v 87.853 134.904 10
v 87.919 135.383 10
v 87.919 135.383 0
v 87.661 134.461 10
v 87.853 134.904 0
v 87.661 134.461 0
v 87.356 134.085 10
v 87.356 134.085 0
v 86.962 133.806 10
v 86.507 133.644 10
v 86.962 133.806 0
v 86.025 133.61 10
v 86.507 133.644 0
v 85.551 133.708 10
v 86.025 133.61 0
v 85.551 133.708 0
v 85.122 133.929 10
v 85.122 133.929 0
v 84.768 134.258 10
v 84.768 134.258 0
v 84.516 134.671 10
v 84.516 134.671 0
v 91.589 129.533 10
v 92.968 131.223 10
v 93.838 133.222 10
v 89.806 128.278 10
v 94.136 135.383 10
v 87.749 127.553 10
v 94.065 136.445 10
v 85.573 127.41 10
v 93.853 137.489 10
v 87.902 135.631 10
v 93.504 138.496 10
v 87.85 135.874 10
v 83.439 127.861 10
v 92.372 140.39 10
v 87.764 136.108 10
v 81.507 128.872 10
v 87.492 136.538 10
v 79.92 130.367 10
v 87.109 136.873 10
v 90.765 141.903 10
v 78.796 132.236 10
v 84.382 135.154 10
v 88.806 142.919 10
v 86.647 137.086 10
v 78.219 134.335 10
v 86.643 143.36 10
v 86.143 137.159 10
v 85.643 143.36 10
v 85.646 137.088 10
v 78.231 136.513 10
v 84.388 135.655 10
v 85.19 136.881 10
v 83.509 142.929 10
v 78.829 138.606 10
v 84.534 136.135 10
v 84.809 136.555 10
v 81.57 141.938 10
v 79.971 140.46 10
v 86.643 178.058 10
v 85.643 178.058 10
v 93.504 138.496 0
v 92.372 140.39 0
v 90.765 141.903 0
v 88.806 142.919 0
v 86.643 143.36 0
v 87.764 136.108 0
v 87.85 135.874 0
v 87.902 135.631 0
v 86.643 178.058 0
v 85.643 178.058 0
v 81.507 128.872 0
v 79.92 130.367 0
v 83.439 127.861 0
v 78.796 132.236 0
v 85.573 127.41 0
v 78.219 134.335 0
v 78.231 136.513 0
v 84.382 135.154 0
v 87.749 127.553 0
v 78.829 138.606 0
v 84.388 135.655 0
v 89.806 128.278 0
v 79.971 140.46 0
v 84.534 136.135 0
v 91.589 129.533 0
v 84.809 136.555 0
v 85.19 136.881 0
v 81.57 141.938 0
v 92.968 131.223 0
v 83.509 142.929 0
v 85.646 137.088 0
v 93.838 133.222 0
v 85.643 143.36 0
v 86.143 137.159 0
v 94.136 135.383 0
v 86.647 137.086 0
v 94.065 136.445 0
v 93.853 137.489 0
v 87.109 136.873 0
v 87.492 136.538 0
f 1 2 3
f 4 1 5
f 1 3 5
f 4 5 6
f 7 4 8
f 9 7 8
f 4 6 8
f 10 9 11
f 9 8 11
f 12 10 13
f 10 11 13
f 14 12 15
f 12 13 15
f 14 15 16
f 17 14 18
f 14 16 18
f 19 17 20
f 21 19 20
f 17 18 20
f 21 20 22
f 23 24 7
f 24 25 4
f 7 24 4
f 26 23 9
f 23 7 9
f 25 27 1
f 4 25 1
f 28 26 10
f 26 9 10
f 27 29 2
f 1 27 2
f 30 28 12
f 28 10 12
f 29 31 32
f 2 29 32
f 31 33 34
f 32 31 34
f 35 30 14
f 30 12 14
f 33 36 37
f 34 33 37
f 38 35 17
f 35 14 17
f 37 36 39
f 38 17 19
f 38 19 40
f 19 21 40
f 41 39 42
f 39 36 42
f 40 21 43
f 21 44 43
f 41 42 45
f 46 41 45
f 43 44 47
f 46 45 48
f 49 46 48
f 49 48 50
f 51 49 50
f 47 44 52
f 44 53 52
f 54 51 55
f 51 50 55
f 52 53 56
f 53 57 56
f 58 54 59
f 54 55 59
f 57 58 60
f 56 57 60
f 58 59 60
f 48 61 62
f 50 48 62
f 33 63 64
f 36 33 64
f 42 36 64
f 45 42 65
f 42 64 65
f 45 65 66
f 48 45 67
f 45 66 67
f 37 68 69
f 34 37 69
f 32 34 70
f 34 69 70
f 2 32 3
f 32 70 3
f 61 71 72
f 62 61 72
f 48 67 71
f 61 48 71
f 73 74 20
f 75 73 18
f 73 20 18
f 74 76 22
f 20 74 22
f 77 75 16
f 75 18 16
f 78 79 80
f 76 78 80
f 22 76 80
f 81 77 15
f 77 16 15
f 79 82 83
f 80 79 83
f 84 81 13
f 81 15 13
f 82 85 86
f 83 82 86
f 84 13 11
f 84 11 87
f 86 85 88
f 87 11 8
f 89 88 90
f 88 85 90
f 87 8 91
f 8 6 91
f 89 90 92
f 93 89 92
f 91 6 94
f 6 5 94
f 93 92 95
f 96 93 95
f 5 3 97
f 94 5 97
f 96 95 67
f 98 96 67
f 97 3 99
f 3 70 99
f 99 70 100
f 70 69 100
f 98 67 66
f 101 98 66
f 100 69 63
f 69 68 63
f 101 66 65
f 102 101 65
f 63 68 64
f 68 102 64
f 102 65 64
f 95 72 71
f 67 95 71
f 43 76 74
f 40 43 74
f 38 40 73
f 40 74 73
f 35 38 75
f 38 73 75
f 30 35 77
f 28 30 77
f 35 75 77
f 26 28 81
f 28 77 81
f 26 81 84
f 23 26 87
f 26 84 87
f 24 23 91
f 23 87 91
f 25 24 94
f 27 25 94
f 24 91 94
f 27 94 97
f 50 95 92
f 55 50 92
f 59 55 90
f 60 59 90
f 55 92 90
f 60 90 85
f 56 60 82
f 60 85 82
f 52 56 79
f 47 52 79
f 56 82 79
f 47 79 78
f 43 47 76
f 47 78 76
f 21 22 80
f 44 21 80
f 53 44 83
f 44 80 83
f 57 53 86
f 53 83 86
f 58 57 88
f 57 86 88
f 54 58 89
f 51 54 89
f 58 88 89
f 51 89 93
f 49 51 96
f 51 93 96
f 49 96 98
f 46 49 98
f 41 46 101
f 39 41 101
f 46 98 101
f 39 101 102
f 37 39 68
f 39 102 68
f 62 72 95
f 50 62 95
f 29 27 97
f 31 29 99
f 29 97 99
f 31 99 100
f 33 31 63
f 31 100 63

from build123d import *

# Parameters (mm, degrees)
EXTRUDE_1_DEPTH = 10


with BuildPart() as part:
    # Model → 凸台-拉伸1 (new body)
    # profile 1 of 8: a face of its own
    with BuildSketch(Plane.XY):
        with BuildLine():
            ThreePointArc((84.515747624, 134.670602669), (84.656484575, 136.354704261), (86.142958351, 137.15869479))
            Line((86.142958351, 137.15869479), (86.142958351, 143.375196939))
            ThreePointArc((86.142958351, 143.375196939), (85.892835846, 143.371282304), (85.642958351, 143.359542231))
            ThreePointArc((85.642958351, 143.359542231), (79.336442428, 139.572267895), (78.795813778, 132.235830705))
            add(Edge.make_bspline(
                [(78.795813778, 132.235830705), (79.201442186, 132.418540823), (79.597751424, 132.591555239), (80.43048274, 132.949140202), (80.863351604, 133.131140862), (82.114964313, 133.6560009), (82.926668954, 133.99465917), (83.986978139, 134.444262968), (84.25259172, 134.55751775), (84.515747624, 134.670602669)],
                knots=[239.817826964, 239.817826964, 239.817826964, 239.817826964, 241.118324831, 241.118324831, 242.624871419, 242.624871419, 245.637964594, 245.637964594, 246.657264609, 246.657264609, 246.657264609, 246.657264609], degree=3))
        make_face()
    # profile 2 of 8: a face of its own
    with BuildSketch(Plane.XY):
        with BuildLine():
            Line((86.142958351, 143.375196939), (86.142958351, 137.15869479))
            ThreePointArc((86.142958351, 137.15869479), (87.108905296, 136.873065368), (87.764175911, 136.108043742))
            add(Edge.make_bspline(
                [(87.764175911, 136.108043742), (88.044686421, 136.233986931), (88.329332122, 136.361475152), (89.512151447, 136.887586955), (90.447565566, 137.295513383), (92.083163303, 137.96177294), (92.753710832, 138.223187829), (93.469726438, 138.48335369), (93.487007878, 138.489621969), (93.504311736, 138.495887208)],
                knots=[0.564975086, 0.564975086, 0.564975086, 0.564975086, 1.587442363, 1.587442363, 4.749752142, 4.749752142, 6.841880027, 6.841880027, 6.893554923, 6.893554923, 6.893554923, 6.893554923], degree=3))
            ThreePointArc((93.504311736, 138.495887208), (90.765079543, 141.903163231), (86.642958351, 143.359542231))
            ThreePointArc((86.642958351, 143.359542231), (86.393080856, 143.371282304), (86.142958351, 143.375196939))
        make_face()
    # profile 3 of 8: a face of its own
    with BuildSketch(Plane.XY):
        with BuildLine():
            ThreePointArc((85.642958351, 143.359542231), (85.892835846, 143.371282304), (86.142958351, 143.375196939))
            Line((86.142958351, 143.375196939), (86.142958351, 178.058382984))
            Line((86.142958351, 178.058382984), (85.642958351, 178.058382984))
            Line((85.642958351, 178.058382984), (85.642958351, 143.359542231))
        make_face()
    # profile 4 of 8: a face of its own
    with BuildSketch(Plane.XY):
        with BuildLine():
            Line((86.142958351, 178.058382984), (86.142958351, 143.375196939))
            ThreePointArc((86.142958351, 143.375196939), (86.393080856, 143.371282304), (86.642958351, 143.359542231))
            Line((86.642958351, 143.359542231), (86.642958351, 178.058382984))
            Line((86.642958351, 178.058382984), (86.142958351, 178.058382984))
        make_face()
    # profile 5 of 8: a face of its own
    with BuildSketch(Plane.XY):
        with BuildLine():
            add(Edge.make_bspline(
                [(87.764175911, 136.108043742), (88.044686421, 136.233986931), (88.329332122, 136.361475152), (89.512151447, 136.887586955), (90.447565566, 137.295513383), (92.083163303, 137.96177294), (92.753710832, 138.223187829), (93.469726438, 138.48335369), (93.487007878, 138.489621969), (93.504311736, 138.495887208)],
                knots=[0.564975086, 0.564975086, 0.564975086, 0.564975086, 1.587442363, 1.587442363, 4.749752142, 4.749752142, 6.841880027, 6.841880027, 6.893554923, 6.893554923, 6.893554923, 6.893554923], degree=3))
            ThreePointArc((87.764175911, 136.108043742), (87.879938578, 135.753476276), (87.919101822, 135.382551319))
            ThreePointArc((87.919101822, 135.382551319), (86.506638101, 133.644039694), (84.515747624, 134.670602669))
            add(Edge.make_bspline(
                [(78.795813778, 132.235830705), (79.201442186, 132.418540823), (79.597751424, 132.591555239), (80.43048274, 132.949140202), (80.863351604, 133.131140862), (82.114964313, 133.6560009), (82.926668954, 133.99465917), (83.986978139, 134.444262968), (84.25259172, 134.55751775), (84.515747624, 134.670602669)],
                knots=[239.817826964, 239.817826964, 239.817826964, 239.817826964, 241.118324831, 241.118324831, 242.624871419, 242.624871419, 245.637964594, 245.637964594, 246.657264609, 246.657264609, 246.657264609, 246.657264609], degree=3))
            ThreePointArc((78.795813778, 132.235830705), (87.749081185, 127.552943829), (94.135603971, 135.382551319))
            ThreePointArc((94.135603971, 135.382551319), (93.976191174, 136.97089875), (93.504311736, 138.495887208))
        make_face()
        with BuildLine():
            Line((88.496502727, 133.902759243), (88.512127727, 133.958314799))
            Line((88.512127727, 133.958314799), (89.343724949, 133.958314799))
            add(Edge.make_bspline(
                [(89.343724949, 133.958314799), (89.366005787, 133.958238455), (89.408980089, 133.958091208), (89.471053535, 133.956776722), (89.528214846, 133.954691019), (89.580306274, 133.951642223), (89.627534592, 133.9479855), (89.669736637, 133.942554801), (89.707184007, 133.937323238), (89.73017603, 133.932393725), (89.740860366, 133.930102993)],
                knots=[0, 0, 0, 0, 1.340730156, 2.585941556, 3.735938728, 4.782417436, 5.725908979, 6.585455251, 7.3426646, 8, 8, 8, 8], degree=3))
            add(Edge.make_bspline(
                [(89.740860366, 133.930102993), (89.765706412, 133.923464048), (89.813724826, 133.910633369), (89.879766264, 133.879782009), (89.937121094, 133.840548316), (89.984372838, 133.792792491), (90.022630996, 133.739889797), (90.049560147, 133.682258653), (90.06727416, 133.621249519), (90.068985126, 133.579098378), (90.069853421, 133.55770716)],
                knots=[0, 0, 0, 0, 1.1444407, 2.211789597, 3.231322223, 4.22529072, 5.191493565, 6.126021885, 7.048977693, 8, 8, 8, 8], degree=3))
            add(Edge.make_bspline(
                [(90.069853421, 133.55770716), (90.068909804, 133.539711572), (90.066994541, 133.503185887), (90.054506044, 133.44816215), (90.032379754, 133.393332999), (90.003916963, 133.338057211), (89.96660929, 133.285016865), (89.920448571, 133.236493922), (89.866039091, 133.192922642), (89.814439589, 133.160967962), (89.76801639, 133.137432734), (89.727972879, 133.120396865), (89.683969739, 133.102912434), (89.635185634, 133.086510324), (89.582232564, 133.070101588), (89.524694533, 133.054211436), (89.463059851, 133.03780512), (89.420153109, 133.028320648), (89.397978421, 133.023418965)],
                knots=[0, 0, 0, 0, 0.926015676, 1.879536179, 2.885868529, 3.961296715, 5.072379891, 6.209732737, 7.395503017, 8.649275246, 9.325055167, 10.071803552, 10.887356143, 11.760683543, 12.718957186, 13.739396155, 14.831694431, 16, 16, 16, 16], degree=3))
            add(Edge.make_bspline(
                [(89.397978421, 133.023418965), (89.42206246, 133.016998306), (89.468651614, 133.00457792), (89.535067023, 132.982763634), (89.595715409, 132.95982056), (89.651100787, 132.936143224), (89.700227585, 132.910105818), (89.744019154, 132.88338132), (89.781886478, 132.854956525), (89.814050432, 132.824870327), (89.84187059, 132.793564633), (89.865689713, 132.761145878), (89.885826791, 132.727400518), (89.902526046, 132.692622975), (89.915086126, 132.656311611), (89.924115105, 132.618958092), (89.930145032, 132.580326591), (89.930688233, 132.554113403), (89.930964532, 132.540780076)],
                knots=[0, 0, 0, 0, 1.531555644, 2.96270413, 4.293681306, 5.516048711, 6.661459008, 7.707599869, 8.666075599, 9.565667882, 10.409627692, 11.23655517, 12.034039933, 12.821499316, 13.603215525, 14.390323465, 15.181238721, 16, 16, 16, 16], degree=3))
            add(Edge.make_bspline(
                [(89.930964532, 132.540780076), (89.930624849, 132.528177306), (89.92994649, 132.503009206), (89.924587774, 132.465179366), (89.915280889, 132.42768631), (89.9032277, 132.389938357), (89.88700207, 132.352716467), (89.867254625, 132.31543414), (89.843812939, 132.2784648), (89.817528115, 132.241608575), (89.788110476, 132.206194712), (89.756210312, 132.172800733), (89.721562196, 132.142334206), (89.685005327, 132.114115641), (89.64647148, 132.087745357), (89.604906283, 132.065034344), (89.561447941, 132.043945869), (89.514368358, 132.025339229), (89.461239324, 132.008793245), (89.399352063, 131.995306447), (89.327899069, 131.98384116), (89.246657378, 131.974383297), (89.155736045, 131.967176307), (89.054848241, 131.962258297), (88.944302551, 131.958502897), (88.867310769, 131.958379194), (88.827231893, 131.958314799)],
                knots=[0, 0, 0, 0, 0.649983419, 1.298035872, 1.965980934, 2.640976837, 3.339692447, 4.057479056, 4.815351188, 5.596173487, 6.391204644, 7.188229986, 7.97597665, 8.768657352, 9.569725703, 10.381602759, 11.209445122, 12.06037968, 12.990438067, 14.076787314, 15.324591579, 16.722421325, 18.294818179, 20.028592824, 21.932642545, 24, 24, 24, 24], degree=3))
            Line((88.827231893, 131.958314799), (87.937040921, 131.958314799))
            Line((87.937040921, 131.958314799), (87.957440227, 132.013870354))
            add(Edge.make_bspline(
                [(87.957440227, 132.013870354), (87.97742018, 132.014006357), (88.014397404, 132.01425806), (88.065230888, 132.01883261), (88.107276247, 132.024531417), (88.141098002, 132.03430147), (88.16901877, 132.046946668), (88.19286513, 132.062820301), (88.214481834, 132.081028857), (88.234102735, 132.103972973), (88.252489424, 132.135057067), (88.271101693, 132.177140141), (88.291189357, 132.23150028), (88.30438723, 132.272063116), (88.311606893, 132.294252299)],
                knots=[0, 0, 0, 0, 1.413684466, 2.616328741, 3.6114587, 4.411948615, 5.099362341, 5.772591528, 6.433556287, 7.094521047, 7.898997588, 8.980549035, 10.348262692, 12, 12, 12, 12], degree=3))
            Line((88.311606893, 132.294252299), (88.686606893, 133.523418965))
            add(Edge.make_bspline(
                [(88.686606893, 133.523418965), (88.691092356, 133.538464662), (88.699711053, 133.567374565), (88.712001207, 133.608636195), (88.721866907, 133.646181737), (88.730508377, 133.679637731), (88.736168228, 133.70945627), (88.741415531, 133.73523107), (88.744065765, 133.75715834), (88.744551035, 133.770520876), (88.744766616, 133.77645716)],
                knots=[0, 0, 0, 0, 1.447737894, 2.781789423, 3.969395032, 5.027424898, 5.966676759, 6.767329987, 7.452388503, 8, 8, 8, 8], degree=3))
            add(Edge.make_bspline(
                [(88.744766616, 133.77645716), (88.744154591, 133.784774328), (88.742938857, 133.801295672), (88.734022406, 133.82476489), (88.718760938, 133.845460846), (88.701810087, 133.860619777), (88.684467991, 133.871410359), (88.667339877, 133.878204886), (88.647188527, 133.884583139), (88.623583927, 133.890341507), (88.596519633, 133.894265038), (88.566331944, 133.898461843), (88.532542139, 133.90073386), (88.508944917, 133.902060003), (88.496502727, 133.902759243)],
                knots=[0, 0, 0, 0, 0.966607597, 1.920083533, 2.872965034, 3.933888757, 4.545873516, 5.239857326, 6.070253167, 7.005125835, 8.062170482, 9.250079418, 10.550039757, 12, 12, 12, 12], degree=3))
        make_face(mode=Mode.SUBTRACT)
    # profile 6 of 8: a face of its own
    with BuildSketch(Plane.XY):
        with BuildLine():
            Line((89.343724949, 133.958314799), (88.512127727, 133.958314799))
            Line((88.512127727, 133.958314799), (88.496502727, 133.902759243))
            add(Edge.make_bspline(
                [(88.744766616, 133.77645716), (88.744154591, 133.784774328), (88.742938857, 133.801295672), (88.734022406, 133.82476489), (88.718760938, 133.845460846), (88.701810087, 133.860619777), (88.684467991, 133.871410359), (88.667339877, 133.878204886), (88.647188527, 133.884583139), (88.623583927, 133.890341507), (88.596519633, 133.894265038), (88.566331944, 133.898461843), (88.532542139, 133.90073386), (88.508944917, 133.902060003), (88.496502727, 133.902759243)],
                knots=[0, 0, 0, 0, 0.966607597, 1.920083533, 2.872965034, 3.933888757, 4.545873516, 5.239857326, 6.070253167, 7.005125835, 8.062170482, 9.250079418, 10.550039757, 12, 12, 12, 12], degree=3))
            add(Edge.make_bspline(
                [(88.686606893, 133.523418965), (88.691092356, 133.538464662), (88.699711053, 133.567374565), (88.712001207, 133.608636195), (88.721866907, 133.646181737), (88.730508377, 133.679637731), (88.736168228, 133.70945627), (88.741415531, 133.73523107), (88.744065765, 133.75715834), (88.744551035, 133.770520876), (88.744766616, 133.77645716)],
                knots=[0, 0, 0, 0, 1.447737894, 2.781789423, 3.969395032, 5.027424898, 5.966676759, 6.767329987, 7.452388503, 8, 8, 8, 8], degree=3))
            Line((88.686606893, 133.523418965), (88.311606893, 132.294252299))
            add(Edge.make_bspline(
                [(87.957440227, 132.013870354), (87.97742018, 132.014006357), (88.014397404, 132.01425806), (88.065230888, 132.01883261), (88.107276247, 132.024531417), (88.141098002, 132.03430147), (88.16901877, 132.046946668), (88.19286513, 132.062820301), (88.214481834, 132.081028857), (88.234102735, 132.103972973), (88.252489424, 132.135057067), (88.271101693, 132.177140141), (88.291189357, 132.23150028), (88.30438723, 132.272063116), (88.311606893, 132.294252299)],
                knots=[0, 0, 0, 0, 1.413684466, 2.616328741, 3.6114587, 4.411948615, 5.099362341, 5.772591528, 6.433556287, 7.094521047, 7.898997588, 8.980549035, 10.348262692, 12, 12, 12, 12], degree=3))
            Line((87.957440227, 132.013870354), (87.937040921, 131.958314799))
            Line((87.937040921, 131.958314799), (88.827231893, 131.958314799))
            add(Edge.make_bspline(
                [(89.930964532, 132.540780076), (89.930624849, 132.528177306), (89.92994649, 132.503009206), (89.924587774, 132.465179366), (89.915280889, 132.42768631), (89.9032277, 132.389938357), (89.88700207, 132.352716467), (89.867254625, 132.31543414), (89.843812939, 132.2784648), (89.817528115, 132.241608575), (89.788110476, 132.206194712), (89.756210312, 132.172800733), (89.721562196, 132.142334206), (89.685005327, 132.114115641), (89.64647148, 132.087745357), (89.604906283, 132.065034344), (89.561447941, 132.043945869), (89.514368358, 132.025339229), (89.461239324, 132.008793245), (89.399352063, 131.995306447), (89.327899069, 131.98384116), (89.246657378, 131.974383297), (89.155736045, 131.967176307), (89.054848241, 131.962258297), (88.944302551, 131.958502897), (88.867310769, 131.958379194), (88.827231893, 131.958314799)],
                knots=[0, 0, 0, 0, 0.649983419, 1.298035872, 1.965980934, 2.640976837, 3.339692447, 4.057479056, 4.815351188, 5.596173487, 6.391204644, 7.188229986, 7.97597665, 8.768657352, 9.569725703, 10.381602759, 11.209445122, 12.06037968, 12.990438067, 14.076787314, 15.324591579, 16.722421325, 18.294818179, 20.028592824, 21.932642545, 24, 24, 24, 24], degree=3))
            add(Edge.make_bspline(
                [(89.397978421, 133.023418965), (89.42206246, 133.016998306), (89.468651614, 133.00457792), (89.535067023, 132.982763634), (89.595715409, 132.95982056), (89.651100787, 132.936143224), (89.700227585, 132.910105818), (89.744019154, 132.88338132), (89.781886478, 132.854956525), (89.814050432, 132.824870327), (89.84187059, 132.793564633), (89.865689713, 132.761145878), (89.885826791, 132.727400518), (89.902526046, 132.692622975), (89.915086126, 132.656311611), (89.924115105, 132.618958092), (89.930145032, 132.580326591), (89.930688233, 132.554113403), (89.930964532, 132.540780076)],
                knots=[0, 0, 0, 0, 1.531555644, 2.96270413, 4.293681306, 5.516048711, 6.661459008, 7.707599869, 8.666075599, 9.565667882, 10.409627692, 11.23655517, 12.034039933, 12.821499316, 13.603215525, 14.390323465, 15.181238721, 16, 16, 16, 16], degree=3))
            add(Edge.make_bspline(
                [(90.069853421, 133.55770716), (90.068909804, 133.539711572), (90.066994541, 133.503185887), (90.054506044, 133.44816215), (90.032379754, 133.393332999), (90.003916963, 133.338057211), (89.96660929, 133.285016865), (89.920448571, 133.236493922), (89.866039091, 133.192922642), (89.814439589, 133.160967962), (89.76801639, 133.137432734), (89.727972879, 133.120396865), (89.683969739, 133.102912434), (89.635185634, 133.086510324), (89.582232564, 133.070101588), (89.524694533, 133.054211436), (89.463059851, 133.03780512), (89.420153109, 133.028320648), (89.397978421, 133.023418965)],
                knots=[0, 0, 0, 0, 0.926015676, 1.879536179, 2.885868529, 3.961296715, 5.072379891, 6.209732737, 7.395503017, 8.649275246, 9.325055167, 10.071803552, 10.887356143, 11.760683543, 12.718957186, 13.739396155, 14.831694431, 16, 16, 16, 16], degree=3))
            add(Edge.make_bspline(
                [(89.740860366, 133.930102993), (89.765706412, 133.923464048), (89.813724826, 133.910633369), (89.879766264, 133.879782009), (89.937121094, 133.840548316), (89.984372838, 133.792792491), (90.022630996, 133.739889797), (90.049560147, 133.682258653), (90.06727416, 133.621249519), (90.068985126, 133.579098378), (90.069853421, 133.55770716)],
                knots=[0, 0, 0, 0, 1.1444407, 2.211789597, 3.231322223, 4.22529072, 5.191493565, 6.126021885, 7.048977693, 8, 8, 8, 8], degree=3))
            add(Edge.make_bspline(
                [(89.343724949, 133.958314799), (89.366005787, 133.958238455), (89.408980089, 133.958091208), (89.471053535, 133.956776722), (89.528214846, 133.954691019), (89.580306274, 133.951642223), (89.627534592, 133.9479855), (89.669736637, 133.942554801), (89.707184007, 133.937323238), (89.73017603, 133.932393725), (89.740860366, 133.930102993)],
                knots=[0, 0, 0, 0, 1.340730156, 2.585941556, 3.735938728, 4.782417436, 5.725908979, 6.585455251, 7.3426646, 8, 8, 8, 8], degree=3))
        make_face()
        with BuildLine():
            Line((88.706138143, 132.072464104), (88.976103421, 132.958314799))
            add(Edge.make_bspline(
                [(89.430964532, 132.644078688), (89.430441852, 132.660330843), (89.429419494, 132.692119925), (89.419600283, 132.738258323), (89.403296389, 132.781320132), (89.381237838, 132.82100225), (89.354471731, 132.856622892), (89.323462753, 132.887050441), (89.288213004, 132.911223027), (89.255407332, 132.926452203), (89.226104751, 132.93524126), (89.200745381, 132.942098979), (89.171785151, 132.946847538), (89.139404255, 132.951470817), (89.103430975, 132.954039215), (89.064108389, 132.956963488), (89.021247777, 132.958043628), (88.991583555, 132.958221813), (88.976103421, 132.958314799)],
                knots=[0, 0, 0, 0, 1.228143642, 2.402238964, 3.548668198, 4.699893356, 5.824967036, 6.90849946, 7.970990416, 9.043411673, 9.628389874, 10.284038706, 11.028969131, 11.846202225, 12.757796755, 13.755882639, 14.828917999, 16, 16, 16, 16], degree=3))
            add(Edge.make_bspline(
                [(88.821155505, 132.06942591), (88.84866324, 132.070042176), (88.90149483, 132.071225781), (88.977653077, 132.079289117), (89.04729144, 132.093510159), (89.110586611, 132.113242321), (89.167457742, 132.138980606), (89.217552738, 132.170698661), (89.261501595, 132.208082635), (89.2979372, 132.251268599), (89.328846354, 132.297584002), (89.356214373, 132.344660624), (89.379460198, 132.392626579), (89.398084458, 132.441483511), (89.412966921, 132.490908205), (89.423483136, 132.541283361), (89.429590579, 132.59242216), (89.430506192, 132.626846468), (89.430964532, 132.644078688)],
                knots=[0, 0, 0, 0, 1.388963014, 2.667654152, 3.861116407, 4.972422251, 6.008704621, 7.003792219, 7.957024742, 8.910257266, 9.846372071, 10.766095332, 11.658099317, 12.534531264, 13.403594638, 14.261813026, 15.129893296, 16, 16, 16, 16], degree=3))
            add(Edge.make_bspline(
                [(88.706138143, 132.072464104), (88.718145002, 132.071986568), (88.740564667, 132.071094895), (88.77168118, 132.070489298), (88.797999092, 132.069228), (88.813920632, 132.069364076), (88.821155505, 132.06942591)],
                knots=[0, 0, 0, 0, 1.253103092, 2.339841935, 3.245611237, 4, 4, 4, 4], degree=3))
        make_face(mode=Mode.SUBTRACT)
        with BuildLine():
            add(Edge.make_bspline(
                [(89.009957588, 133.06942591), (89.040964931, 133.070570593), (89.099755845, 133.07274095), (89.182813, 133.084922643), (89.255836718, 133.10333032), (89.319543098, 133.130145134), (89.374641126, 133.166360577), (89.423580421, 133.211498469), (89.466745908, 133.266282486), (89.502435571, 133.329409773), (89.5315918, 133.395614628), (89.553937743, 133.461398157), (89.567055283, 133.52579051), (89.568934562, 133.568214358), (89.569853421, 133.58895716)],
                knots=[0, 0, 0, 0, 1.296009604, 2.457275658, 3.501521971, 4.436013454, 5.331587176, 6.243103961, 7.207269813, 8.2340209, 9.265443947, 10.227236849, 11.133221619, 12, 12, 12, 12], degree=3))
            Line((89.009957588, 133.06942591), (89.246936755, 133.847203688))
            Line((89.246936755, 133.847203688), (89.322457588, 133.847203688))
            add(Edge.make_bspline(
                [(89.569853421, 133.58895716), (89.569072153, 133.607269528), (89.567569787, 133.642483954), (89.554596876, 133.692552102), (89.533611397, 133.73747673), (89.503783189, 133.776134545), (89.467346373, 133.808286513), (89.423990323, 133.831331138), (89.37493161, 133.845039178), (89.340343061, 133.846465927), (89.322457588, 133.847203688)],
                knots=[0, 0, 0, 0, 1.090928831, 2.09784069, 3.063011639, 4.029725012, 4.990253829, 5.940176499, 6.934881111, 8, 8, 8, 8], degree=3))
        make_face(mode=Mode.SUBTRACT)
    # profile 7 of 8: a face of its own
    with BuildSketch(Plane.XY):
        with BuildLine():
            Line((89.246936755, 133.847203688), (89.009957588, 133.06942591))
            add(Edge.make_bspline(
                [(89.009957588, 133.06942591), (89.040964931, 133.070570593), (89.099755845, 133.07274095), (89.182813, 133.084922643), (89.255836718, 133.10333032), (89.319543098, 133.130145134), (89.374641126, 133.166360577), (89.423580421, 133.211498469), (89.466745908, 133.266282486), (89.502435571, 133.329409773), (89.5315918, 133.395614628), (89.553937743, 133.461398157), (89.567055283, 133.52579051), (89.568934562, 133.568214358), (89.569853421, 133.58895716)],
                knots=[0, 0, 0, 0, 1.296009604, 2.457275658, 3.501521971, 4.436013454, 5.331587176, 6.243103961, 7.207269813, 8.2340209, 9.265443947, 10.227236849, 11.133221619, 12, 12, 12, 12], degree=3))
            add(Edge.make_bspline(
                [(89.569853421, 133.58895716), (89.569072153, 133.607269528), (89.567569787, 133.642483954), (89.554596876, 133.692552102), (89.533611397, 133.73747673), (89.503783189, 133.776134545), (89.467346373, 133.808286513), (89.423990323, 133.831331138), (89.37493161, 133.845039178), (89.340343061, 133.846465927), (89.322457588, 133.847203688)],
                knots=[0, 0, 0, 0, 1.090928831, 2.09784069, 3.063011639, 4.029725012, 4.990253829, 5.940176499, 6.934881111, 8, 8, 8, 8], degree=3))
            Line((89.322457588, 133.847203688), (89.246936755, 133.847203688))
        make_face()
    # profile 8 of 8: a face of its own
    with BuildSketch(Plane.XY):
        with BuildLine():
            add(Edge.make_bspline(
                [(89.430964532, 132.644078688), (89.430441852, 132.660330843), (89.429419494, 132.692119925), (89.419600283, 132.738258323), (89.403296389, 132.781320132), (89.381237838, 132.82100225), (89.354471731, 132.856622892), (89.323462753, 132.887050441), (89.288213004, 132.911223027), (89.255407332, 132.926452203), (89.226104751, 132.93524126), (89.200745381, 132.942098979), (89.171785151, 132.946847538), (89.139404255, 132.951470817), (89.103430975, 132.954039215), (89.064108389, 132.956963488), (89.021247777, 132.958043628), (88.991583555, 132.958221813), (88.976103421, 132.958314799)],
                knots=[0, 0, 0, 0, 1.228143642, 2.402238964, 3.548668198, 4.699893356, 5.824967036, 6.90849946, 7.970990416, 9.043411673, 9.628389874, 10.284038706, 11.028969131, 11.846202225, 12.757796755, 13.755882639, 14.828917999, 16, 16, 16, 16], degree=3))
            Line((88.976103421, 132.958314799), (88.706138143, 132.072464104))
            add(Edge.make_bspline(
                [(88.706138143, 132.072464104), (88.718145002, 132.071986568), (88.740564667, 132.071094895), (88.77168118, 132.070489298), (88.797999092, 132.069228), (88.813920632, 132.069364076), (88.821155505, 132.06942591)],
                knots=[0, 0, 0, 0, 1.253103092, 2.339841935, 3.245611237, 4, 4, 4, 4], degree=3))
            add(Edge.make_bspline(
                [(88.821155505, 132.06942591), (88.84866324, 132.070042176), (88.90149483, 132.071225781), (88.977653077, 132.079289117), (89.04729144, 132.093510159), (89.110586611, 132.113242321), (89.167457742, 132.138980606), (89.217552738, 132.170698661), (89.261501595, 132.208082635), (89.2979372, 132.251268599), (89.328846354, 132.297584002), (89.356214373, 132.344660624), (89.379460198, 132.392626579), (89.398084458, 132.441483511), (89.412966921, 132.490908205), (89.423483136, 132.541283361), (89.429590579, 132.59242216), (89.430506192, 132.626846468), (89.430964532, 132.644078688)],
                knots=[0, 0, 0, 0, 1.388963014, 2.667654152, 3.861116407, 4.972422251, 6.008704621, 7.003792219, 7.957024742, 8.910257266, 9.846372071, 10.766095332, 11.658099317, 12.534531264, 13.403594638, 14.261813026, 15.129893296, 16, 16, 16, 16], degree=3))
        make_face()
    extrude(amount=EXTRUDE_1_DEPTH)


solid = part.part
